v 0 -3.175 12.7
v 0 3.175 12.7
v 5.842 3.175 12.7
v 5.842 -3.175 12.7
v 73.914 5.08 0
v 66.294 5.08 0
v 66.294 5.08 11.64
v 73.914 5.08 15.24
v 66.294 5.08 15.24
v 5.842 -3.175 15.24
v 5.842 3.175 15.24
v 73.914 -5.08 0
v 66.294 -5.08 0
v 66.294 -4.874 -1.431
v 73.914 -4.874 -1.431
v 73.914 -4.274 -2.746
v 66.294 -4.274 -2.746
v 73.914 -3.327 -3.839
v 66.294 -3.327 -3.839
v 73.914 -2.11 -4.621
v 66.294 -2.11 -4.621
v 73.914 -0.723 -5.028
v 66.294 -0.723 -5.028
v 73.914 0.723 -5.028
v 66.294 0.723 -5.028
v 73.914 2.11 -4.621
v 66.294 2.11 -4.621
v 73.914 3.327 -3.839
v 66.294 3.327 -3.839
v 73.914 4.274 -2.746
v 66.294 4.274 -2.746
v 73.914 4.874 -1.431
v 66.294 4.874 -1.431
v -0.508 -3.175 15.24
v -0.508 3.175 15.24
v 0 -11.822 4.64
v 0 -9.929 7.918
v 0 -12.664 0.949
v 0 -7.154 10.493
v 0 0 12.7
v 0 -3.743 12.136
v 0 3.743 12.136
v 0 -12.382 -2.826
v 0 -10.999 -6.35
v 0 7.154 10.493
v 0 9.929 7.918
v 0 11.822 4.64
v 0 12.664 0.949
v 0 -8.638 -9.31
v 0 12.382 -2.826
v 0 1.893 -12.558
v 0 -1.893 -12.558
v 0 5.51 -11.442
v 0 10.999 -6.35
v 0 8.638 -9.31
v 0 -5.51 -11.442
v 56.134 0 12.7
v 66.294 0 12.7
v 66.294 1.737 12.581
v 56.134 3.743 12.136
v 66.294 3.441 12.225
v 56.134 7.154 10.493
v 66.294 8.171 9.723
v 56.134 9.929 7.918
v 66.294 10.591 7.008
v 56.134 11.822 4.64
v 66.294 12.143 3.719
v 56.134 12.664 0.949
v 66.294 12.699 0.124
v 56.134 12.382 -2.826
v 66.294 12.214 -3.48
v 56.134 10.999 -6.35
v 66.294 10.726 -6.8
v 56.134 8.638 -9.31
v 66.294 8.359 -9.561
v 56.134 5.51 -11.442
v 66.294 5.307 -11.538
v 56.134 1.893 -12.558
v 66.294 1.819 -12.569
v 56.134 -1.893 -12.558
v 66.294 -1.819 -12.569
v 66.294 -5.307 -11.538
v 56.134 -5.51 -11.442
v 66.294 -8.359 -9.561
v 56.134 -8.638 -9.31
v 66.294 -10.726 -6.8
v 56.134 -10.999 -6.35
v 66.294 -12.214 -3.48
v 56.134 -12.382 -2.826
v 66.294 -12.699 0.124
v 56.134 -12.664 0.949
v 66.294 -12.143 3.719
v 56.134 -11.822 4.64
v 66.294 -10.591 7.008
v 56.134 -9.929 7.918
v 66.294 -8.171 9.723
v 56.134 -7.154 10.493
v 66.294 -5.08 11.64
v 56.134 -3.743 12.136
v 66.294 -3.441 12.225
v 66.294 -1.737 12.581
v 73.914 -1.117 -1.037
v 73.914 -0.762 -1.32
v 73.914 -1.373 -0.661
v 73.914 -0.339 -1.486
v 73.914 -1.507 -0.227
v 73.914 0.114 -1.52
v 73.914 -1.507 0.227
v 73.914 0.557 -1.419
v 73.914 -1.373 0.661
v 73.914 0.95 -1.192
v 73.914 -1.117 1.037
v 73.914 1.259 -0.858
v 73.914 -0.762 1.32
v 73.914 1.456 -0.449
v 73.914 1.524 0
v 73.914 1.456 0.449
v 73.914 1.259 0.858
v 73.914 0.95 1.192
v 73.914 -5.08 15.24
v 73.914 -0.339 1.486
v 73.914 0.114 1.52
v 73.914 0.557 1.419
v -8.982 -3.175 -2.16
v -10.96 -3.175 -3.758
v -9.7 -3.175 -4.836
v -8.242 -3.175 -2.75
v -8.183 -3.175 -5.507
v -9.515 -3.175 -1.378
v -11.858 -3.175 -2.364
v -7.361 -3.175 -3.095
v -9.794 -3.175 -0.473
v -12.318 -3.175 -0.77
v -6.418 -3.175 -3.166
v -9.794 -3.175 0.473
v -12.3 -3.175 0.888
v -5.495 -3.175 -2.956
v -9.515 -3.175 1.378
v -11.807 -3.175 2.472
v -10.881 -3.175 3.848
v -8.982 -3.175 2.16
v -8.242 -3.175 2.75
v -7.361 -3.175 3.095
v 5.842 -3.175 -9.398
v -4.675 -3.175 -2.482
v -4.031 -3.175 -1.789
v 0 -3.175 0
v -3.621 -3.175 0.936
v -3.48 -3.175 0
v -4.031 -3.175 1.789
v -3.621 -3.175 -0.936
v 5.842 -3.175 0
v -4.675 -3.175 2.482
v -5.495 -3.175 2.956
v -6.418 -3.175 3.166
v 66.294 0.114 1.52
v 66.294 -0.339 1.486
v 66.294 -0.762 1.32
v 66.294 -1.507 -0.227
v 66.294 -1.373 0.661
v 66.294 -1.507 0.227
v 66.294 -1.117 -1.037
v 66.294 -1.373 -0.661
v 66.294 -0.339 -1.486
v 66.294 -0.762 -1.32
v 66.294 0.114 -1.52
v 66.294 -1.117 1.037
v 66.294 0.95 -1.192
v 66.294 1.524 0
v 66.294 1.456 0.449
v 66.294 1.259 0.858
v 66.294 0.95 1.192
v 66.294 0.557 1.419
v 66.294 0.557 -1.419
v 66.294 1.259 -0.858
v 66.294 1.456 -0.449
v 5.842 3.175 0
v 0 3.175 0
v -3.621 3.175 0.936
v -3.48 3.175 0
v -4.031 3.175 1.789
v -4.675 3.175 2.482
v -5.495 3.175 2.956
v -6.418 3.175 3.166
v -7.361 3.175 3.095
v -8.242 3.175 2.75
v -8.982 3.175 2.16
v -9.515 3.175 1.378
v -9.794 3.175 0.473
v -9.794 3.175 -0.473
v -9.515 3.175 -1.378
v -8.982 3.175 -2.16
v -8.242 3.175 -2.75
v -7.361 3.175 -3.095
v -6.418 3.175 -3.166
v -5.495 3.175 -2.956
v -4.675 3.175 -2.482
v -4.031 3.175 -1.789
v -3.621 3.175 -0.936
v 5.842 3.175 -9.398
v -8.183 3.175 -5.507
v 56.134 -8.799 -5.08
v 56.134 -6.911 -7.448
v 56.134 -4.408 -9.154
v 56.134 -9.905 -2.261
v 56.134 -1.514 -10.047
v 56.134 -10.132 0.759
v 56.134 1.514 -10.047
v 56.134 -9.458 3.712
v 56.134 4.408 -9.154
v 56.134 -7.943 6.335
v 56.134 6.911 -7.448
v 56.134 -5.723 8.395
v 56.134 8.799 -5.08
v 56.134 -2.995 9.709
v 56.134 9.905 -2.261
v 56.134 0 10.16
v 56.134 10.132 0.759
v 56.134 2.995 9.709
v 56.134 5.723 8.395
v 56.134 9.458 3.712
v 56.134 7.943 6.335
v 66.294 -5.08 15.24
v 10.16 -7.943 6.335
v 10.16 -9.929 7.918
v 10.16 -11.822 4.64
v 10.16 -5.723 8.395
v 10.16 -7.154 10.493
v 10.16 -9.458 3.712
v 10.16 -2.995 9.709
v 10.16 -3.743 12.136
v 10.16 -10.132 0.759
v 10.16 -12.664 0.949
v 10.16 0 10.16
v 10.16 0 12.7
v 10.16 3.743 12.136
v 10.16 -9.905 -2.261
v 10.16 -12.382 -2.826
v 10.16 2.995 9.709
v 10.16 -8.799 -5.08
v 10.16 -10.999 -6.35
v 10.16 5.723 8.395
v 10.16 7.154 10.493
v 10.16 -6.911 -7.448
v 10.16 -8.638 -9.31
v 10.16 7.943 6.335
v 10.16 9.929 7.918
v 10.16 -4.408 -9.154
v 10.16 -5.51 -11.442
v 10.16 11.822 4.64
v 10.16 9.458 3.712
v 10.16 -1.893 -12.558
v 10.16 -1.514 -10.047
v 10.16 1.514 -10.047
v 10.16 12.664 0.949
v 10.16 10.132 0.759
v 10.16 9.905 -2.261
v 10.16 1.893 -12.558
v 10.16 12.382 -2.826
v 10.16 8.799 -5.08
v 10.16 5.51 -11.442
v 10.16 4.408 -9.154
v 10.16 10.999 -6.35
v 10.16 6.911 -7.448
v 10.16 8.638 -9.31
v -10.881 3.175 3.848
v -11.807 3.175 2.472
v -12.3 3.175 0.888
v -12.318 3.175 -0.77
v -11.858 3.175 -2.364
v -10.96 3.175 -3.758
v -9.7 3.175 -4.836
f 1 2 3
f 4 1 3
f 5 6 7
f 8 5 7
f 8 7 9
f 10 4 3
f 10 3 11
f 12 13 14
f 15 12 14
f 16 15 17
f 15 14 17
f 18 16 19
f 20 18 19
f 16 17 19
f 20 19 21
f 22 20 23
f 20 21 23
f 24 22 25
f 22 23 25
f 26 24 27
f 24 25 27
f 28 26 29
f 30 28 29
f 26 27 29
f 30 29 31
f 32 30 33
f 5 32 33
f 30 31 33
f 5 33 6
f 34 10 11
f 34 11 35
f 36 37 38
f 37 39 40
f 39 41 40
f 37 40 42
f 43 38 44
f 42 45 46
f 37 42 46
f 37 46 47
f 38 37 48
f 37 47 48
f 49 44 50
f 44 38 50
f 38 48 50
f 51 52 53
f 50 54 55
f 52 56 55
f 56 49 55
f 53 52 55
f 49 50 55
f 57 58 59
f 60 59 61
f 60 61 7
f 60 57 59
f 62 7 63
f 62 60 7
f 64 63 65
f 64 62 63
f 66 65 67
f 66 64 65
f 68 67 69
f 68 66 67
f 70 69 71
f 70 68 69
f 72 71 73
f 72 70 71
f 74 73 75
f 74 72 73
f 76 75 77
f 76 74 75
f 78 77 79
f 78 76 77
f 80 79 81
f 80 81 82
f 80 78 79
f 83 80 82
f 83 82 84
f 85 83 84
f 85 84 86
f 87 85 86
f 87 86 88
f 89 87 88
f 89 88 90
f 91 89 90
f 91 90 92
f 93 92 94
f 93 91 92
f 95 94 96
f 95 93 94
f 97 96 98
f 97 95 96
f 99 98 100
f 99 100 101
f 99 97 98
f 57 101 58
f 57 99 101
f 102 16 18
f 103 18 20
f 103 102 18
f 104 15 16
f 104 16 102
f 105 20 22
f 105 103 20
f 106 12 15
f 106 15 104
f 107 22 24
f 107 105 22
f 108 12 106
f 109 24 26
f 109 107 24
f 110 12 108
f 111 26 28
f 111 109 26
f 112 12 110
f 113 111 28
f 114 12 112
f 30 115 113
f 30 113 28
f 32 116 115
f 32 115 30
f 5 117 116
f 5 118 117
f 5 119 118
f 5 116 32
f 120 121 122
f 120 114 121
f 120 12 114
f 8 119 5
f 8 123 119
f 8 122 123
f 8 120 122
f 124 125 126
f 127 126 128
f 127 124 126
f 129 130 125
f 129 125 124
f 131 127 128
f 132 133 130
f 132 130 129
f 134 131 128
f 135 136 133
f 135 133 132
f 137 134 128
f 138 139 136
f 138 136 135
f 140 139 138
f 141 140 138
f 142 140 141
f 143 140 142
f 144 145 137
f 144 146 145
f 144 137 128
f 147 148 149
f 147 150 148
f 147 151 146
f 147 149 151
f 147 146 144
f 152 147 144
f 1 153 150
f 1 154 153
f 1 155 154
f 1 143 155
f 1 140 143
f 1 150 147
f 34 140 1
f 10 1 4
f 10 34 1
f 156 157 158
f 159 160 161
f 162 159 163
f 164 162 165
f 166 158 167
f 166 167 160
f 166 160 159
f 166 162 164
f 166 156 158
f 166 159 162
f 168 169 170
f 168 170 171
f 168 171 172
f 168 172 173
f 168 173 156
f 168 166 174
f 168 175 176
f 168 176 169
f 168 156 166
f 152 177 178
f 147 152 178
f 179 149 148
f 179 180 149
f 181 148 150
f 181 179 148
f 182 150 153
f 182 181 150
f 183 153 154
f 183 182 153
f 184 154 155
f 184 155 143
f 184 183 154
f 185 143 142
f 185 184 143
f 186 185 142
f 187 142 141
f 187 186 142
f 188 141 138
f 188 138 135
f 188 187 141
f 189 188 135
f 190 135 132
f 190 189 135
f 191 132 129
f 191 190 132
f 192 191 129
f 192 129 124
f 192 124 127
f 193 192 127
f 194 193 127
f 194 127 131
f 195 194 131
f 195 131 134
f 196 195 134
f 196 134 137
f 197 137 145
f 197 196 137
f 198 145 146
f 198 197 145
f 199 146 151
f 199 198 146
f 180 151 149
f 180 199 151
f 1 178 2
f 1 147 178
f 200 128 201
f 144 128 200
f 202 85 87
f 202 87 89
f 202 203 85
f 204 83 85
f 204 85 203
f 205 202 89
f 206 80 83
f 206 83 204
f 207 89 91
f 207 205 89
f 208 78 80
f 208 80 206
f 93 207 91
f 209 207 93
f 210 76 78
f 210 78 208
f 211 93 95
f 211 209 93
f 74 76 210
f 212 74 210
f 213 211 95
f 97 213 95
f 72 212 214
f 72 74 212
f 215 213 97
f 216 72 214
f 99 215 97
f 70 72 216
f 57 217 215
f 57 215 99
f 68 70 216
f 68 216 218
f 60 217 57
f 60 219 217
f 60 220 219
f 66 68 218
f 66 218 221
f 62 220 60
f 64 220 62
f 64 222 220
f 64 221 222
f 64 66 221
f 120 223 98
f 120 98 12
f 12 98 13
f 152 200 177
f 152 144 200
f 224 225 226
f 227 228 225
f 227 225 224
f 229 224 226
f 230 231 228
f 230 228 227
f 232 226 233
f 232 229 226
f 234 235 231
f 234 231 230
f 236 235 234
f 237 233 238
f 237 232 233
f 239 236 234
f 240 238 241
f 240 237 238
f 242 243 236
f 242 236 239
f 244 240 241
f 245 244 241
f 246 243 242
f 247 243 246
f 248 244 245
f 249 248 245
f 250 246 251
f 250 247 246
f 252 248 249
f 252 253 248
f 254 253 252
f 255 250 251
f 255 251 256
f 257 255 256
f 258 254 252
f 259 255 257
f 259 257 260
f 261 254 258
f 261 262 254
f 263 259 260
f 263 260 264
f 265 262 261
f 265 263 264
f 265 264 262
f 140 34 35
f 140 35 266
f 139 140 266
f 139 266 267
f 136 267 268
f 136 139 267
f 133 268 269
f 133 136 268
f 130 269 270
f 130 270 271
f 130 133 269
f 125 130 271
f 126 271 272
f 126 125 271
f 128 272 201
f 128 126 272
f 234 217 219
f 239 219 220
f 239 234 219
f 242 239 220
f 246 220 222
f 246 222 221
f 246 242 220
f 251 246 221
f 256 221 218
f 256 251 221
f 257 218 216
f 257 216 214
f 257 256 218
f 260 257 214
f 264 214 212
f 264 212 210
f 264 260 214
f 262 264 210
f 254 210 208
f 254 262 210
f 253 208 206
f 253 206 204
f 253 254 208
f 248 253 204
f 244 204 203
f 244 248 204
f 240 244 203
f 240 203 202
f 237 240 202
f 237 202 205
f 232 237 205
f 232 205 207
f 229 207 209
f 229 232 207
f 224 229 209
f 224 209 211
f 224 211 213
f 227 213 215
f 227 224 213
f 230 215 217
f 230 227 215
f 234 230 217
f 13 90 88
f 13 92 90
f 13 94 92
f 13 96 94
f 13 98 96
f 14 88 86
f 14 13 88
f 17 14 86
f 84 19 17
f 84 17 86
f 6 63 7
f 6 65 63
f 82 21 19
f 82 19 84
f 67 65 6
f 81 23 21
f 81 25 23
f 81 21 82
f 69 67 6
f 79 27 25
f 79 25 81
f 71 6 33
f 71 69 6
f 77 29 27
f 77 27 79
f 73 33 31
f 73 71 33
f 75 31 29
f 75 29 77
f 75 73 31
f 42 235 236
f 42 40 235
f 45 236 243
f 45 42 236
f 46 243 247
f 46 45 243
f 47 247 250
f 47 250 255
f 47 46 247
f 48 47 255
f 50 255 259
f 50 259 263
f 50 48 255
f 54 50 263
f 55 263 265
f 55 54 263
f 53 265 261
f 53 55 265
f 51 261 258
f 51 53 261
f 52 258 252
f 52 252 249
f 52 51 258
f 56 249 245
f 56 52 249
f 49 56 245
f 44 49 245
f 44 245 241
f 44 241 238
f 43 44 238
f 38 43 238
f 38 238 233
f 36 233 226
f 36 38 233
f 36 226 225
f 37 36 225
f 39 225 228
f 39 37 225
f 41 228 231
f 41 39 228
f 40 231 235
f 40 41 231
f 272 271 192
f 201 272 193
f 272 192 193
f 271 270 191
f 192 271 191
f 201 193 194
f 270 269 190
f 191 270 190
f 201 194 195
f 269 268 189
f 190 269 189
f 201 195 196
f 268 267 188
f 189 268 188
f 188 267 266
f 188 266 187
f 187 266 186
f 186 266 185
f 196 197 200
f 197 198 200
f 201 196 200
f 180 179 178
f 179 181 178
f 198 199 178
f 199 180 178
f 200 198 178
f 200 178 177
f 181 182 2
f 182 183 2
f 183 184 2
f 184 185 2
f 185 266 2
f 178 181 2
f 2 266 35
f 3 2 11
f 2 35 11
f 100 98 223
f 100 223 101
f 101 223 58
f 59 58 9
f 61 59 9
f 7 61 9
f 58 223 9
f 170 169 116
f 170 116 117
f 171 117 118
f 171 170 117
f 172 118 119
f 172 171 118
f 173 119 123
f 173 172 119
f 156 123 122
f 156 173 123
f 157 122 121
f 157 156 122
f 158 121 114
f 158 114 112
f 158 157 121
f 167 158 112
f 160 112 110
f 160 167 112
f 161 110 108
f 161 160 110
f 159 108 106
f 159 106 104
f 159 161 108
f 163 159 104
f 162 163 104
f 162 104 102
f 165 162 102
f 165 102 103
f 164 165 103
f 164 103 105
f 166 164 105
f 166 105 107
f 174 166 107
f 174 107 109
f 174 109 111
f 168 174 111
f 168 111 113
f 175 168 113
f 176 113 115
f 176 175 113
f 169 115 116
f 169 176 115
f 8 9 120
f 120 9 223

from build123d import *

# Parameters (mm, degrees)
F0_W     = 5.842
F0_H     = 12.7
F0_R     = 3.175
F2_DEPTH = 3.175
F3_R     = 1.524
F4_DEPTH = 7.62


# Not quite as in the source:
# - the program builds the solid bodies; features that only make, move or delete a surface that nothing else refers to are left out


with BuildPart() as f1:
    # F0 (on Front) → F1 (revolve)
    with BuildSketch(Plane.XZ):
        Polygon((5.842, 12.7), (5.842, 0), (66.294, 0), (66.294, 12.7), (56.134, 12.7), (56.134, 10.16), (10.16, 10.16), (10.16, 12.7), align=None)
        with Locations((2.921, 6.35)):
            Rectangle(F0_W, F0_H)
    revolve(axis=Axis((33.147, 0, 0), (-1, 0, 0)))

    # F3 (on face) → F4 (join)
    with BuildSketch(Plane.YZ.offset(66.294)):
        with BuildLine():
            ThreePointArc((-5.08, 0), (0, 5.08), (5.08, 0))
            Line((5.08, 0), (5.08, 11.6397422652))
            ThreePointArc((5.08, 11.6397422652), (0, 12.7), (-5.08, 11.6397422652))
            Line((-5.08, 11.6397422652), (-5.08, 0))
        make_face()
        with BuildLine():
            ThreePointArc((-5.08, 11.6397422652), (0, 12.7), (5.08, 11.6397422652))
            Line((5.08, 11.6397422652), (5.08, 15.24))
            Line((5.08, 15.24), (-5.08, 15.24))
            Line((-5.08, 15.24), (-5.08, 11.6397422652))
        make_face()
        with BuildLine():
            ThreePointArc((-5.08, 0), (0, -5.08), (5.08, 0))
            ThreePointArc((5.08, 0), (0, 5.08), (-5.08, 0))
        make_face()
        Circle(F3_R, mode=Mode.SUBTRACT)
    extrude(amount=F4_DEPTH)


with BuildPart() as f2:
    # F0 (on Front) → F2 (new body, symmetric)
    with BuildSketch(Plane.XZ):
        with BuildLine():
            ThreePointArc((-8.1826630726, -5.5069827884), (-3.1957909266, -4.5493385486), (-0.9398, 0))
            ThreePointArc((-0.9398, 0), (-4.5919612295, 5.3297205562), (-10.8806298187, 3.8475430269))
            ThreePointArc((-10.8806298187, 3.8475430269), (-12.1459778134, -1.5837270034), (-8.1826630726, -5.5069827884))
        make_face()
        with Locations((-6.6548, 0)):
            Circle(F0_R, mode=Mode.SUBTRACT)
        with BuildLine():
            Line((-0.9398, 0), (0, 0))
            Line((0, 0), (0, 12.7))
            Line((0, 12.7), (5.842, 12.7))
            Line((5.842, 12.7), (5.842, 15.24))
            Line((5.842, 15.24), (-0.508, 15.24))
            Line((-0.508, 15.24), (-10.8806298187, 3.8475430269))
            ThreePointArc((-10.8806298187, 3.8475430269), (-4.5919612295, 5.3297205562), (-0.9398, 0))
        make_face()
        with BuildLine():
            Line((5.842, 0), (0, 0))
            Line((0, 0), (-0.9398, 0))
            ThreePointArc((-0.9398, 0), (-3.1957909266, -4.5493385486), (-8.1826630726, -5.5069827884))
            Line((-8.1826630726, -5.5069827884), (5.842, -9.398))
            Line((5.842, -9.398), (5.842, 0))
        make_face()
    extrude(amount=F2_DEPTH, both=True)


solid = Compound([f1.part, f2.part])
